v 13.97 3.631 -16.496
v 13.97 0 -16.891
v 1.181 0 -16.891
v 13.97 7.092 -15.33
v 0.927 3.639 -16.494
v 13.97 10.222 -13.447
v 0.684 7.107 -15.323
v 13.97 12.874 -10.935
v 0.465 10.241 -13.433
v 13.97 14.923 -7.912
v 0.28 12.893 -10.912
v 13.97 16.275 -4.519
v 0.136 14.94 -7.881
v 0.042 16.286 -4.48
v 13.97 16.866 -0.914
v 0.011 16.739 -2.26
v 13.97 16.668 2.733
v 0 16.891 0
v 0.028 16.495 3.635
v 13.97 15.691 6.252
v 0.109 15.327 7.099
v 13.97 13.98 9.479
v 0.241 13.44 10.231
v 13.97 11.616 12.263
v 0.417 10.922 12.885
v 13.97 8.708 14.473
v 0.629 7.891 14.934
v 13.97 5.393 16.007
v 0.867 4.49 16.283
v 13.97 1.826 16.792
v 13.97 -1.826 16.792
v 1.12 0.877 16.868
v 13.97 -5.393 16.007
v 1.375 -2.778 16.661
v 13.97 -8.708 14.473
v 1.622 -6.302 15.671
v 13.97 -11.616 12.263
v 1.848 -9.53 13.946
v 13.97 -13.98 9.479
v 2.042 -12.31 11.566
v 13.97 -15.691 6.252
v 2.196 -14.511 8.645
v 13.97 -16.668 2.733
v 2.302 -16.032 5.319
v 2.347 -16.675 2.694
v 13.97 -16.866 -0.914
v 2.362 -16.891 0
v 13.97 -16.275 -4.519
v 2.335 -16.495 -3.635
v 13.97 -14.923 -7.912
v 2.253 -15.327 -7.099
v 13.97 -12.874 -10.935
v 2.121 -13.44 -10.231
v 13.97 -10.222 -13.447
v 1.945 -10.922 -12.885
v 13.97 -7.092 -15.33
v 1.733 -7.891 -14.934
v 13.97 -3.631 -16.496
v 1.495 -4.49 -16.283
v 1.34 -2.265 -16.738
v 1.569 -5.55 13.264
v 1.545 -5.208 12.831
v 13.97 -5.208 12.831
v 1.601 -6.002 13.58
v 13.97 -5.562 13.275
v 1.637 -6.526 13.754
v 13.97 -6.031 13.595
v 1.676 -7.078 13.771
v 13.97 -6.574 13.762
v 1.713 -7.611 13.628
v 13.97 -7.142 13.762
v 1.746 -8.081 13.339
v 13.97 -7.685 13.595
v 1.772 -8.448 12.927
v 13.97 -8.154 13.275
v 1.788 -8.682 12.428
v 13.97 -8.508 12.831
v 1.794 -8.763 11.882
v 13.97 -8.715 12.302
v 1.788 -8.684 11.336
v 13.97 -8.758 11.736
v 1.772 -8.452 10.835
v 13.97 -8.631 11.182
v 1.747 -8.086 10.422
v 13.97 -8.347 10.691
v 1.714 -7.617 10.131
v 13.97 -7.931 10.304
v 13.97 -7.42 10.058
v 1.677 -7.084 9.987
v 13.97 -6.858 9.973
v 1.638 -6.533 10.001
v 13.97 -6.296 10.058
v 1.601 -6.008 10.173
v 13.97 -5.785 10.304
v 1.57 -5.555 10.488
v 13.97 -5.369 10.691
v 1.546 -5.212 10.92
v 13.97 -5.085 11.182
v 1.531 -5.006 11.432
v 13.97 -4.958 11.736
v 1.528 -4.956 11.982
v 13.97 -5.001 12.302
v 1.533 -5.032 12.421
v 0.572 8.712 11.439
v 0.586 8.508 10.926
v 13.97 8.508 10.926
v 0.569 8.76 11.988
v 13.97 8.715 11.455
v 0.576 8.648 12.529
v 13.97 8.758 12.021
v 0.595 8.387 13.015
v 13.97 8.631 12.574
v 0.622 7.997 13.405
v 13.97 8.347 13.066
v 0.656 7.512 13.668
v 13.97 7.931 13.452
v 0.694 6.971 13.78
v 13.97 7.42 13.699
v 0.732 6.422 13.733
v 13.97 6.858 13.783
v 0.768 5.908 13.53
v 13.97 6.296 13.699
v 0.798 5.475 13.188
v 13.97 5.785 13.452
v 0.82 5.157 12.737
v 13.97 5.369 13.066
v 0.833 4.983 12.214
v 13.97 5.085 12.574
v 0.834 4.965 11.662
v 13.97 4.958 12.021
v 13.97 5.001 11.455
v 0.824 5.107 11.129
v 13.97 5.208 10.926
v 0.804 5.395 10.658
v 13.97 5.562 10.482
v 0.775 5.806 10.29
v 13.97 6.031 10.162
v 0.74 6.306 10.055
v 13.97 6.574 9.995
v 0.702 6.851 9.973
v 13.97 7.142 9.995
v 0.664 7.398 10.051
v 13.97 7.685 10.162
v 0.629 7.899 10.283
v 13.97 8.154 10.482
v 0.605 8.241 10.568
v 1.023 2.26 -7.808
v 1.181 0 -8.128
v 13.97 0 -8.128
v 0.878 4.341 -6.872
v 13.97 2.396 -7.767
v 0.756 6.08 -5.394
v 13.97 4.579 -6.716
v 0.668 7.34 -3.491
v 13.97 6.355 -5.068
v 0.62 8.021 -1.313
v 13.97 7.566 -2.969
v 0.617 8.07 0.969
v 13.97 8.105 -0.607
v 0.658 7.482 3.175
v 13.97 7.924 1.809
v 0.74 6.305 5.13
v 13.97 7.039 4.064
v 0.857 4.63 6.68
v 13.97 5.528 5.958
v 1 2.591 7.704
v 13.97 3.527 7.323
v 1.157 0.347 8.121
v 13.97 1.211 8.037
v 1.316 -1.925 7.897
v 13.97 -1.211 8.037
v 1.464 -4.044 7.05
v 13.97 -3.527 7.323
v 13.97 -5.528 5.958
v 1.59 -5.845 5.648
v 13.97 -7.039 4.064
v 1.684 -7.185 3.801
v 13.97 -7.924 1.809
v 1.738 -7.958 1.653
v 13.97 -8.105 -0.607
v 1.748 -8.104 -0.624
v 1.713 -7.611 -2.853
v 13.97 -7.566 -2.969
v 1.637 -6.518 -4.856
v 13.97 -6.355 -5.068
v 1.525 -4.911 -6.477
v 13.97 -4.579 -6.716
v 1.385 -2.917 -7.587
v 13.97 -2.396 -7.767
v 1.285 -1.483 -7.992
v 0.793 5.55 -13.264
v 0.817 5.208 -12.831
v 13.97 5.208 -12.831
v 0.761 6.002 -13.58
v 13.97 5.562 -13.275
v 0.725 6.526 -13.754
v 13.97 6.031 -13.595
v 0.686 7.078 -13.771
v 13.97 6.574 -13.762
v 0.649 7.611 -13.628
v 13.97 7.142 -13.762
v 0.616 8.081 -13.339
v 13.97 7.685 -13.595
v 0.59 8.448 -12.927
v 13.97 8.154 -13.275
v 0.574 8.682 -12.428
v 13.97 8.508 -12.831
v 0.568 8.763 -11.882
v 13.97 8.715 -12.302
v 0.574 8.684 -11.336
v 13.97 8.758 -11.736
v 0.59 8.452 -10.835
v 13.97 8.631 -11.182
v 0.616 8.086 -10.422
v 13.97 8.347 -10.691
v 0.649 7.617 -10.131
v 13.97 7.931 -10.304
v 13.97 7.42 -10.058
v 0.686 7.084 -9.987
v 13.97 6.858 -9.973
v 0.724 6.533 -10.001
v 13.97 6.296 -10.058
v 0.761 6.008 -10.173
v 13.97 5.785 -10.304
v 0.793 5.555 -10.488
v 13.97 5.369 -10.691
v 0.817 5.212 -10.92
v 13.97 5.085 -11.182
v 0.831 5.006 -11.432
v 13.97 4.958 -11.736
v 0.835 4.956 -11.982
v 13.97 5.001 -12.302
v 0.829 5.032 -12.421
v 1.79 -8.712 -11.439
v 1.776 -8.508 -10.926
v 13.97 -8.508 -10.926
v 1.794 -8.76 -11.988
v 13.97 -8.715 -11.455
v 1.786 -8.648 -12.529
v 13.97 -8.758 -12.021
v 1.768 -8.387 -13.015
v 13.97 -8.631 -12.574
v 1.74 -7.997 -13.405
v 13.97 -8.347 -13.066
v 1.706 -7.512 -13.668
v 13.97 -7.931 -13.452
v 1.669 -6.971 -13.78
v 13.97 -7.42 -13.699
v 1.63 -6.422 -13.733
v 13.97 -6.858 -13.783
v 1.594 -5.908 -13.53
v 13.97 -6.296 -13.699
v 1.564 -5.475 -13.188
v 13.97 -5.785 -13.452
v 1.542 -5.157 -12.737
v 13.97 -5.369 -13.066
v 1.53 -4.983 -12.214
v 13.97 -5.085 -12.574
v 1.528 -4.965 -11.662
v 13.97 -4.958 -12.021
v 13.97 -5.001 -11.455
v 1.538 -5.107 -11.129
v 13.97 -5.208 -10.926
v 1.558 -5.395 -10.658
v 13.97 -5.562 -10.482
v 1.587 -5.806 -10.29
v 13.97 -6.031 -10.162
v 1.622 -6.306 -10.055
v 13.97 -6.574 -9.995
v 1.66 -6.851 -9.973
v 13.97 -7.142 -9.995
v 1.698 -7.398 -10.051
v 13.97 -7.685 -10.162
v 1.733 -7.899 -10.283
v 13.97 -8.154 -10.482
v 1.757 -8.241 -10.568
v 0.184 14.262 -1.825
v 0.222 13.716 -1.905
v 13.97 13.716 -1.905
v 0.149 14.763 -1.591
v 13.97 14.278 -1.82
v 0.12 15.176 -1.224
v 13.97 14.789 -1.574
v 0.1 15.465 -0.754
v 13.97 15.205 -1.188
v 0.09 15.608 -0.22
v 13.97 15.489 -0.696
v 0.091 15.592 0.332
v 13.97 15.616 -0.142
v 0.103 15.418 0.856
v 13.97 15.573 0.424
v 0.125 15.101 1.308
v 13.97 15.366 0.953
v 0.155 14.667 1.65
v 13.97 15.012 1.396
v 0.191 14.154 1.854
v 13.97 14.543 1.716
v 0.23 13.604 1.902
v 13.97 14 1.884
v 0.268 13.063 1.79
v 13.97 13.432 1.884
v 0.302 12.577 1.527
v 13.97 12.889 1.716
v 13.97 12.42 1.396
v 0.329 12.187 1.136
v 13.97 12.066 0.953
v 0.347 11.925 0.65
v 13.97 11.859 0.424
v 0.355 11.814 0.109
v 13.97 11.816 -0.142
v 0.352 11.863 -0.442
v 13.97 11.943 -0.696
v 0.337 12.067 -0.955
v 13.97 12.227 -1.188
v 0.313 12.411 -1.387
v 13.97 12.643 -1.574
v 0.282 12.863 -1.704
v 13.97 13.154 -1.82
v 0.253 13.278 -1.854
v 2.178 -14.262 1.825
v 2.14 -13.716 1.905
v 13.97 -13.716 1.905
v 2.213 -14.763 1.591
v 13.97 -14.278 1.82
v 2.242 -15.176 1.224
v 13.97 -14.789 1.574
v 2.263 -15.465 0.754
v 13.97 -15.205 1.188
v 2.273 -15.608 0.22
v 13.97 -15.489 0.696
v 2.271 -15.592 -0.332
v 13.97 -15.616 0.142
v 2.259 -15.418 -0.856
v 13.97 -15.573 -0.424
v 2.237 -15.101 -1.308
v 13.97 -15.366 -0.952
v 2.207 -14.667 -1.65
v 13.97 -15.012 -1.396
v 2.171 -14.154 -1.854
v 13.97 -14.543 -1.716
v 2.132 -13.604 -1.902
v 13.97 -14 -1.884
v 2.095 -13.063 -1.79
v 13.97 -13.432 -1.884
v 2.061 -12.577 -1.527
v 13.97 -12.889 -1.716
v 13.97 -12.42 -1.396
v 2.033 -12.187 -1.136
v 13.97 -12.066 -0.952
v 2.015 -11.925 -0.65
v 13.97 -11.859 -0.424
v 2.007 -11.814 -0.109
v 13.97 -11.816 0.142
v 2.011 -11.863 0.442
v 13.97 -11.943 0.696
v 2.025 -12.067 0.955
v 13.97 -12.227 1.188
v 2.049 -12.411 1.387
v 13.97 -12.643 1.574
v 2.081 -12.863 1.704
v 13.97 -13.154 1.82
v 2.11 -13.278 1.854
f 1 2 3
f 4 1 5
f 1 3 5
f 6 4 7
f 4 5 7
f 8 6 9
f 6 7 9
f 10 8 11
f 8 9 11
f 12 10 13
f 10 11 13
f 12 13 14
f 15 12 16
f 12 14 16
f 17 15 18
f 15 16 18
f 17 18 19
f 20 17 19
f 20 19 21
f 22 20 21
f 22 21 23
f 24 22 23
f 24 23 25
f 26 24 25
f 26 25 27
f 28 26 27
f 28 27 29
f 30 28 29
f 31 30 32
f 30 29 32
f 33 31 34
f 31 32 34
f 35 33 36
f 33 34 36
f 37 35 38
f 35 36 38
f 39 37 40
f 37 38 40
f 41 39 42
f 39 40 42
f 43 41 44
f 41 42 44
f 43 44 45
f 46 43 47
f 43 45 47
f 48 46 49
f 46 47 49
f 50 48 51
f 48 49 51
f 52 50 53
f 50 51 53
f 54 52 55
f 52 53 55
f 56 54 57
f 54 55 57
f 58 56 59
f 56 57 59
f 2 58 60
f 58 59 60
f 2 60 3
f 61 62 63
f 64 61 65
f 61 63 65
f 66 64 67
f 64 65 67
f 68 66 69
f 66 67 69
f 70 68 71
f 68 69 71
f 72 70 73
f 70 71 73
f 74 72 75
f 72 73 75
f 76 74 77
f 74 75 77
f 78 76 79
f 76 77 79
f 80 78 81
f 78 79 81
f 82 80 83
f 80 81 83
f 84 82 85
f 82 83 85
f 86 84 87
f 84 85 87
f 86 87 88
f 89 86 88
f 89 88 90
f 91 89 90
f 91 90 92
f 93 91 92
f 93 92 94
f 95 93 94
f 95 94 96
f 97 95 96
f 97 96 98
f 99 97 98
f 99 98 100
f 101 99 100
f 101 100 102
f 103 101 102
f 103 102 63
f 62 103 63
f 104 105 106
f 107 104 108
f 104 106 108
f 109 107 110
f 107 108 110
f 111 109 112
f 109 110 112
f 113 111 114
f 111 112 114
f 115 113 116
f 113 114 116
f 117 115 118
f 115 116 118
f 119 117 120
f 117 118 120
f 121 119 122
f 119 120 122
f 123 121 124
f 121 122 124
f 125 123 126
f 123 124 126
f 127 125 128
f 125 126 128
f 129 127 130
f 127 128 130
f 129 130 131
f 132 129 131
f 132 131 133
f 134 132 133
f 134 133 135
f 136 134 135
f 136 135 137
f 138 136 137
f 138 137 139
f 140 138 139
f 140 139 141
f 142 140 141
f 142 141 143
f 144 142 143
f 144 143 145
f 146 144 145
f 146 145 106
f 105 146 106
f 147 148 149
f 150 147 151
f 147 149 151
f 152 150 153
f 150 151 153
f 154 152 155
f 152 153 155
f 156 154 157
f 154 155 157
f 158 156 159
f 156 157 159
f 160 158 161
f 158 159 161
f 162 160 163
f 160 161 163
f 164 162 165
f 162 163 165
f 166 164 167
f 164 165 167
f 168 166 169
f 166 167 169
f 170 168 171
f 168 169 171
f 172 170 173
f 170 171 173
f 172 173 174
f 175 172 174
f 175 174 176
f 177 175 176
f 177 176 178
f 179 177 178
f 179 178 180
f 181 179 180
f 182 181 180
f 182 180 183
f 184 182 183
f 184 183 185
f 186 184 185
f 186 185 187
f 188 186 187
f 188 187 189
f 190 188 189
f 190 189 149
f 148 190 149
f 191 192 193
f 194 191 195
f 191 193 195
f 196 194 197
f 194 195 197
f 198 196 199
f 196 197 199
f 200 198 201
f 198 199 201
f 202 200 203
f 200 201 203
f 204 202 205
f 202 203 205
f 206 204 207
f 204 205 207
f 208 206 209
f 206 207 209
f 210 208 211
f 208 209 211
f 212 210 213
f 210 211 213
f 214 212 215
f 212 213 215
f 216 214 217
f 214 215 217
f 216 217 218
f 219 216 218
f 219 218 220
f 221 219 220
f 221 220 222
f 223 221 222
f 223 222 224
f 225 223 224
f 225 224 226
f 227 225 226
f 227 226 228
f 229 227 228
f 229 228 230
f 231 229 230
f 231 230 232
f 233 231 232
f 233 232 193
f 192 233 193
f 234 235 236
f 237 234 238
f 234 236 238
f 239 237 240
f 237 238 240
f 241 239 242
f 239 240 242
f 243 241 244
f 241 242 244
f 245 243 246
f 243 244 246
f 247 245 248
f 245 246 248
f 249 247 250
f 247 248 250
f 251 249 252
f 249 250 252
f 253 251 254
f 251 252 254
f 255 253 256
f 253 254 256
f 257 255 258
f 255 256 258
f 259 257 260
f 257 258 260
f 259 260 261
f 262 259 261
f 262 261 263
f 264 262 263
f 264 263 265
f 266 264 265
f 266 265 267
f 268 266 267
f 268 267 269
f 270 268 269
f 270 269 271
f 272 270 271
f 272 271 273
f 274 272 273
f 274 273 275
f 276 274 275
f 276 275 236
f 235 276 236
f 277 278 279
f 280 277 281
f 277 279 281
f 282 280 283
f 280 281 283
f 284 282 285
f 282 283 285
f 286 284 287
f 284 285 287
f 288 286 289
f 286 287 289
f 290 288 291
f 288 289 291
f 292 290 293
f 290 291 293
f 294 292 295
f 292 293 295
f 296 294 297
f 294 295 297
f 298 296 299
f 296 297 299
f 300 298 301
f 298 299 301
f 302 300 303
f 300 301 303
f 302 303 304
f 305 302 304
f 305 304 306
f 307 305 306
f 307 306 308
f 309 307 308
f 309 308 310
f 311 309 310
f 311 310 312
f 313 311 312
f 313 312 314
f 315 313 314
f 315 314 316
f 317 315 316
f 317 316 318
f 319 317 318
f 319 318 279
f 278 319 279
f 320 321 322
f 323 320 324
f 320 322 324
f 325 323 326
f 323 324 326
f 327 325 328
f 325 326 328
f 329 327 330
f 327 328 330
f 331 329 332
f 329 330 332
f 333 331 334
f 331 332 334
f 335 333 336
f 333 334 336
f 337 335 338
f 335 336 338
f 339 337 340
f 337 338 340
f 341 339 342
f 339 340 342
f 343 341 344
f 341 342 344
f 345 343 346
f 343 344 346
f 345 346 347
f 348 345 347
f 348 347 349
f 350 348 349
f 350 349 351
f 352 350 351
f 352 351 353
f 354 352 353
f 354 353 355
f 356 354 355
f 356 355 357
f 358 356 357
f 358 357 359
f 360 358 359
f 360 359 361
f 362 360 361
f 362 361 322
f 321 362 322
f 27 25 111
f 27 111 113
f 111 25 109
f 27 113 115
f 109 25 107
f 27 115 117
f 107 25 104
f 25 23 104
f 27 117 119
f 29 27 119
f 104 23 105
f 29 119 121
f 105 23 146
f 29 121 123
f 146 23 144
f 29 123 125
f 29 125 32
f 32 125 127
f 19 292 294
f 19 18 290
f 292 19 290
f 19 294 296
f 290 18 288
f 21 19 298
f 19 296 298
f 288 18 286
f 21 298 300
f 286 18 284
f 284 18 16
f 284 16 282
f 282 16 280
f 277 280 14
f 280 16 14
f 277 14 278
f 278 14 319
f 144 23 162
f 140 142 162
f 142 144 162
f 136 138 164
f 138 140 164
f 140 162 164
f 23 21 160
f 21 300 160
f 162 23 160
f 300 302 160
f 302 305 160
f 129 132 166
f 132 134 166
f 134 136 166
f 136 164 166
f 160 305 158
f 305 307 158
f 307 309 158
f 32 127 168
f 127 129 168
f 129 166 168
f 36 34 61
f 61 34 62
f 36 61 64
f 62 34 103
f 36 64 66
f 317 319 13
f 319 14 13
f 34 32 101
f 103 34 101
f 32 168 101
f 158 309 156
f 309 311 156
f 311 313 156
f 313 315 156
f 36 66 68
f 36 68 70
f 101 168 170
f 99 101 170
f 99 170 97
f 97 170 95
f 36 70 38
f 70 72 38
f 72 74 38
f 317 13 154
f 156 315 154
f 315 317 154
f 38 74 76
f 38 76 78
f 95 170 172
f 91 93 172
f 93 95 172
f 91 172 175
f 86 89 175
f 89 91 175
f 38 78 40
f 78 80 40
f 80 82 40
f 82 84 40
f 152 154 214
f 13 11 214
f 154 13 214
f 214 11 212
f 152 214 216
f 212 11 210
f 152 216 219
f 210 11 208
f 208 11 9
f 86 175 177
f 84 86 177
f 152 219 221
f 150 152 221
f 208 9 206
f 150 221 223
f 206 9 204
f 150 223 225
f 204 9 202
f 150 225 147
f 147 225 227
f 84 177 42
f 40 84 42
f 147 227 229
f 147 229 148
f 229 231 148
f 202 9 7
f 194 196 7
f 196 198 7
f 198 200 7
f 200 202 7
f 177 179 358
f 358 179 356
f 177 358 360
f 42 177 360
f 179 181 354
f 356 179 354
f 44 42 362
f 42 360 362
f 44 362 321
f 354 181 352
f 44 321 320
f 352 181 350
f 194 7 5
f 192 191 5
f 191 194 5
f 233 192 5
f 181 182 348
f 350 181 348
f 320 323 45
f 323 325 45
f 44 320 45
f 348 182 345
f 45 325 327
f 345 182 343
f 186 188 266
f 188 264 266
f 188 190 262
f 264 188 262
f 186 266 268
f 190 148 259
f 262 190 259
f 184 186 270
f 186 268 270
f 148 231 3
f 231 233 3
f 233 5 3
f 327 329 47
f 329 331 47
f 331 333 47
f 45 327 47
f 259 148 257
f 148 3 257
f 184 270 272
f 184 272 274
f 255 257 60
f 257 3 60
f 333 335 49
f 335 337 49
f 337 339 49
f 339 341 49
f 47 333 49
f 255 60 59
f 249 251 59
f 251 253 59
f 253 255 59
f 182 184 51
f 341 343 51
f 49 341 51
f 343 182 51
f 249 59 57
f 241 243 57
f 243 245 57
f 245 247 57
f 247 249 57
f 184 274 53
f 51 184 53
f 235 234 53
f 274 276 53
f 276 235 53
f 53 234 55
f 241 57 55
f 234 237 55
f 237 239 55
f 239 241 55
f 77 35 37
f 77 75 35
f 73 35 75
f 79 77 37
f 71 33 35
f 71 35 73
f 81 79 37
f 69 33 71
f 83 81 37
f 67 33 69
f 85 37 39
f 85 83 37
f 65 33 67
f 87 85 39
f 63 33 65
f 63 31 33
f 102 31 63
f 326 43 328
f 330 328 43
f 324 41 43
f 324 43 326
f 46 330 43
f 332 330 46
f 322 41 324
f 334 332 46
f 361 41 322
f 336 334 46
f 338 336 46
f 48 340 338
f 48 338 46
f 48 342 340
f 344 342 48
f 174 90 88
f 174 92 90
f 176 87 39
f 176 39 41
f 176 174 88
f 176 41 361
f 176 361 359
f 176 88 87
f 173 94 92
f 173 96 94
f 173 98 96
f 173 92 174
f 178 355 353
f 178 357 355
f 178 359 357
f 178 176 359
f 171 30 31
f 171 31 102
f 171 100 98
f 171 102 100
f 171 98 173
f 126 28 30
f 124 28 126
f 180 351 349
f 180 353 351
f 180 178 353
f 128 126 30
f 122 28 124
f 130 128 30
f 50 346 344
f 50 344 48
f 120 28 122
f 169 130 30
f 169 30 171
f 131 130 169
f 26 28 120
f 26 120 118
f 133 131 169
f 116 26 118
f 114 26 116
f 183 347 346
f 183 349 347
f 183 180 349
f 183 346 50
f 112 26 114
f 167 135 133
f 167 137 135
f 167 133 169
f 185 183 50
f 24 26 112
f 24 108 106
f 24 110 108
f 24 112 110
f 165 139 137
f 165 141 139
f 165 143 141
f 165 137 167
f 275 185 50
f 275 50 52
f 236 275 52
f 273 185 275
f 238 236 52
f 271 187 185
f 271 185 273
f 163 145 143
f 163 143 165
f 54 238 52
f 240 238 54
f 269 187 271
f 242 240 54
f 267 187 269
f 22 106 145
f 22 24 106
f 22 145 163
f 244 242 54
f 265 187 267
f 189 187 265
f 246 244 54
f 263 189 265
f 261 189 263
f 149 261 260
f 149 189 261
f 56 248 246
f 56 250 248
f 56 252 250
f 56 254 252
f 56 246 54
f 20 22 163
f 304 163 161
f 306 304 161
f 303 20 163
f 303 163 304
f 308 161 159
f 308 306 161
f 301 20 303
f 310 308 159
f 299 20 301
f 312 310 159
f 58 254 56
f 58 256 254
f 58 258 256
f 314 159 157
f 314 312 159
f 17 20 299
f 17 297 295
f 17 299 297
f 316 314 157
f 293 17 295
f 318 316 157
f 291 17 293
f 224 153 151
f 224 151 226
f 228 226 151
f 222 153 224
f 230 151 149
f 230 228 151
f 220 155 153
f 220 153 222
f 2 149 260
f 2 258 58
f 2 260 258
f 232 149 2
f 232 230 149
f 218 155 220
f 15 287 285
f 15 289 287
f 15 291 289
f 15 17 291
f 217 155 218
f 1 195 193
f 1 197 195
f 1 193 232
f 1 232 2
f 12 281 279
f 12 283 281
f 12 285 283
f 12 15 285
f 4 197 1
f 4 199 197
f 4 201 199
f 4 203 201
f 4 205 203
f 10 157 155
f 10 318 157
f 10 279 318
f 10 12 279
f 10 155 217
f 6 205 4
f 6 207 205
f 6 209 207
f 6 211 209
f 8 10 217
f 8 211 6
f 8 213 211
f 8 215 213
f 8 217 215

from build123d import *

# Parameters (mm, degrees)
SKETCH1_R               = 16.891
BOSS_EXTRUDE1_DEPTH     = 13.97
SKETCH2_R               = 8.128
CUT_EXTRUDE1_DEPTH      = 28.672597674
CUT_EXTRUDE2_DEPTH      = 28.672597674
CUT_EXTRUDE2_DEPTH_BACK = 28.672597674
SKETCH7_R               = 1.905
CUT_EXTRUDE3_DEPTH      = 28.672597674
CIRPATTERN1_COUNT       = 6


with BuildPart() as part:
    # Sketch1 → Boss-Extrude1 (new body)
    with BuildSketch(Plane(origin=(0, 0, 0), x_dir=(0, 0, -1), z_dir=(1, 0, 0))):
        Circle(SKETCH1_R)
    extrude(amount=BOSS_EXTRUDE1_DEPTH)

    # Sketch2 → Cut-Extrude1 (cut, through all)
    with BuildSketch(Plane(origin=(13.97, 0, 0), x_dir=(0, 0, -1), z_dir=(1, 0, 0))):
        Circle(SKETCH2_R)
    extrude(amount=-CUT_EXTRUDE1_DEPTH, mode=Mode.SUBTRACT)

    # Sketch3 → Cut-Extrude2 (cut, two sides: drawn at the far end of the back side and taken through both)
    with BuildSketch(Plane.XY.offset(-CUT_EXTRUDE2_DEPTH_BACK)):
        Polygon((0, 16.891), (2.362267561, -16.891), (0, -16.891), align=None)
    extrude(amount=CUT_EXTRUDE2_DEPTH + CUT_EXTRUDE2_DEPTH_BACK, mode=Mode.SUBTRACT)

    # Sketch7 → Cut-Extrude3 (cut, through all)
    with BuildSketch(Plane(origin=(13.97, 0, 0), x_dir=(0, 0, -1), z_dir=(1, 0, 0))):
        with Locations((0, 13.716)):
            Circle(SKETCH7_R)
    cut_extrude3 = extrude(amount=-CUT_EXTRUDE3_DEPTH, mode=Mode.SUBTRACT)

    # CirPattern1: Cut-Extrude3 ×6 about axis
    cirpattern1_axis = Axis((0, 0, 0), (1, 0, 0))
    for i in range(1, CIRPATTERN1_COUNT):
        add(cut_extrude3.rotate(cirpattern1_axis, i * 360 / CIRPATTERN1_COUNT), mode=Mode.SUBTRACT)


solid = part.part
